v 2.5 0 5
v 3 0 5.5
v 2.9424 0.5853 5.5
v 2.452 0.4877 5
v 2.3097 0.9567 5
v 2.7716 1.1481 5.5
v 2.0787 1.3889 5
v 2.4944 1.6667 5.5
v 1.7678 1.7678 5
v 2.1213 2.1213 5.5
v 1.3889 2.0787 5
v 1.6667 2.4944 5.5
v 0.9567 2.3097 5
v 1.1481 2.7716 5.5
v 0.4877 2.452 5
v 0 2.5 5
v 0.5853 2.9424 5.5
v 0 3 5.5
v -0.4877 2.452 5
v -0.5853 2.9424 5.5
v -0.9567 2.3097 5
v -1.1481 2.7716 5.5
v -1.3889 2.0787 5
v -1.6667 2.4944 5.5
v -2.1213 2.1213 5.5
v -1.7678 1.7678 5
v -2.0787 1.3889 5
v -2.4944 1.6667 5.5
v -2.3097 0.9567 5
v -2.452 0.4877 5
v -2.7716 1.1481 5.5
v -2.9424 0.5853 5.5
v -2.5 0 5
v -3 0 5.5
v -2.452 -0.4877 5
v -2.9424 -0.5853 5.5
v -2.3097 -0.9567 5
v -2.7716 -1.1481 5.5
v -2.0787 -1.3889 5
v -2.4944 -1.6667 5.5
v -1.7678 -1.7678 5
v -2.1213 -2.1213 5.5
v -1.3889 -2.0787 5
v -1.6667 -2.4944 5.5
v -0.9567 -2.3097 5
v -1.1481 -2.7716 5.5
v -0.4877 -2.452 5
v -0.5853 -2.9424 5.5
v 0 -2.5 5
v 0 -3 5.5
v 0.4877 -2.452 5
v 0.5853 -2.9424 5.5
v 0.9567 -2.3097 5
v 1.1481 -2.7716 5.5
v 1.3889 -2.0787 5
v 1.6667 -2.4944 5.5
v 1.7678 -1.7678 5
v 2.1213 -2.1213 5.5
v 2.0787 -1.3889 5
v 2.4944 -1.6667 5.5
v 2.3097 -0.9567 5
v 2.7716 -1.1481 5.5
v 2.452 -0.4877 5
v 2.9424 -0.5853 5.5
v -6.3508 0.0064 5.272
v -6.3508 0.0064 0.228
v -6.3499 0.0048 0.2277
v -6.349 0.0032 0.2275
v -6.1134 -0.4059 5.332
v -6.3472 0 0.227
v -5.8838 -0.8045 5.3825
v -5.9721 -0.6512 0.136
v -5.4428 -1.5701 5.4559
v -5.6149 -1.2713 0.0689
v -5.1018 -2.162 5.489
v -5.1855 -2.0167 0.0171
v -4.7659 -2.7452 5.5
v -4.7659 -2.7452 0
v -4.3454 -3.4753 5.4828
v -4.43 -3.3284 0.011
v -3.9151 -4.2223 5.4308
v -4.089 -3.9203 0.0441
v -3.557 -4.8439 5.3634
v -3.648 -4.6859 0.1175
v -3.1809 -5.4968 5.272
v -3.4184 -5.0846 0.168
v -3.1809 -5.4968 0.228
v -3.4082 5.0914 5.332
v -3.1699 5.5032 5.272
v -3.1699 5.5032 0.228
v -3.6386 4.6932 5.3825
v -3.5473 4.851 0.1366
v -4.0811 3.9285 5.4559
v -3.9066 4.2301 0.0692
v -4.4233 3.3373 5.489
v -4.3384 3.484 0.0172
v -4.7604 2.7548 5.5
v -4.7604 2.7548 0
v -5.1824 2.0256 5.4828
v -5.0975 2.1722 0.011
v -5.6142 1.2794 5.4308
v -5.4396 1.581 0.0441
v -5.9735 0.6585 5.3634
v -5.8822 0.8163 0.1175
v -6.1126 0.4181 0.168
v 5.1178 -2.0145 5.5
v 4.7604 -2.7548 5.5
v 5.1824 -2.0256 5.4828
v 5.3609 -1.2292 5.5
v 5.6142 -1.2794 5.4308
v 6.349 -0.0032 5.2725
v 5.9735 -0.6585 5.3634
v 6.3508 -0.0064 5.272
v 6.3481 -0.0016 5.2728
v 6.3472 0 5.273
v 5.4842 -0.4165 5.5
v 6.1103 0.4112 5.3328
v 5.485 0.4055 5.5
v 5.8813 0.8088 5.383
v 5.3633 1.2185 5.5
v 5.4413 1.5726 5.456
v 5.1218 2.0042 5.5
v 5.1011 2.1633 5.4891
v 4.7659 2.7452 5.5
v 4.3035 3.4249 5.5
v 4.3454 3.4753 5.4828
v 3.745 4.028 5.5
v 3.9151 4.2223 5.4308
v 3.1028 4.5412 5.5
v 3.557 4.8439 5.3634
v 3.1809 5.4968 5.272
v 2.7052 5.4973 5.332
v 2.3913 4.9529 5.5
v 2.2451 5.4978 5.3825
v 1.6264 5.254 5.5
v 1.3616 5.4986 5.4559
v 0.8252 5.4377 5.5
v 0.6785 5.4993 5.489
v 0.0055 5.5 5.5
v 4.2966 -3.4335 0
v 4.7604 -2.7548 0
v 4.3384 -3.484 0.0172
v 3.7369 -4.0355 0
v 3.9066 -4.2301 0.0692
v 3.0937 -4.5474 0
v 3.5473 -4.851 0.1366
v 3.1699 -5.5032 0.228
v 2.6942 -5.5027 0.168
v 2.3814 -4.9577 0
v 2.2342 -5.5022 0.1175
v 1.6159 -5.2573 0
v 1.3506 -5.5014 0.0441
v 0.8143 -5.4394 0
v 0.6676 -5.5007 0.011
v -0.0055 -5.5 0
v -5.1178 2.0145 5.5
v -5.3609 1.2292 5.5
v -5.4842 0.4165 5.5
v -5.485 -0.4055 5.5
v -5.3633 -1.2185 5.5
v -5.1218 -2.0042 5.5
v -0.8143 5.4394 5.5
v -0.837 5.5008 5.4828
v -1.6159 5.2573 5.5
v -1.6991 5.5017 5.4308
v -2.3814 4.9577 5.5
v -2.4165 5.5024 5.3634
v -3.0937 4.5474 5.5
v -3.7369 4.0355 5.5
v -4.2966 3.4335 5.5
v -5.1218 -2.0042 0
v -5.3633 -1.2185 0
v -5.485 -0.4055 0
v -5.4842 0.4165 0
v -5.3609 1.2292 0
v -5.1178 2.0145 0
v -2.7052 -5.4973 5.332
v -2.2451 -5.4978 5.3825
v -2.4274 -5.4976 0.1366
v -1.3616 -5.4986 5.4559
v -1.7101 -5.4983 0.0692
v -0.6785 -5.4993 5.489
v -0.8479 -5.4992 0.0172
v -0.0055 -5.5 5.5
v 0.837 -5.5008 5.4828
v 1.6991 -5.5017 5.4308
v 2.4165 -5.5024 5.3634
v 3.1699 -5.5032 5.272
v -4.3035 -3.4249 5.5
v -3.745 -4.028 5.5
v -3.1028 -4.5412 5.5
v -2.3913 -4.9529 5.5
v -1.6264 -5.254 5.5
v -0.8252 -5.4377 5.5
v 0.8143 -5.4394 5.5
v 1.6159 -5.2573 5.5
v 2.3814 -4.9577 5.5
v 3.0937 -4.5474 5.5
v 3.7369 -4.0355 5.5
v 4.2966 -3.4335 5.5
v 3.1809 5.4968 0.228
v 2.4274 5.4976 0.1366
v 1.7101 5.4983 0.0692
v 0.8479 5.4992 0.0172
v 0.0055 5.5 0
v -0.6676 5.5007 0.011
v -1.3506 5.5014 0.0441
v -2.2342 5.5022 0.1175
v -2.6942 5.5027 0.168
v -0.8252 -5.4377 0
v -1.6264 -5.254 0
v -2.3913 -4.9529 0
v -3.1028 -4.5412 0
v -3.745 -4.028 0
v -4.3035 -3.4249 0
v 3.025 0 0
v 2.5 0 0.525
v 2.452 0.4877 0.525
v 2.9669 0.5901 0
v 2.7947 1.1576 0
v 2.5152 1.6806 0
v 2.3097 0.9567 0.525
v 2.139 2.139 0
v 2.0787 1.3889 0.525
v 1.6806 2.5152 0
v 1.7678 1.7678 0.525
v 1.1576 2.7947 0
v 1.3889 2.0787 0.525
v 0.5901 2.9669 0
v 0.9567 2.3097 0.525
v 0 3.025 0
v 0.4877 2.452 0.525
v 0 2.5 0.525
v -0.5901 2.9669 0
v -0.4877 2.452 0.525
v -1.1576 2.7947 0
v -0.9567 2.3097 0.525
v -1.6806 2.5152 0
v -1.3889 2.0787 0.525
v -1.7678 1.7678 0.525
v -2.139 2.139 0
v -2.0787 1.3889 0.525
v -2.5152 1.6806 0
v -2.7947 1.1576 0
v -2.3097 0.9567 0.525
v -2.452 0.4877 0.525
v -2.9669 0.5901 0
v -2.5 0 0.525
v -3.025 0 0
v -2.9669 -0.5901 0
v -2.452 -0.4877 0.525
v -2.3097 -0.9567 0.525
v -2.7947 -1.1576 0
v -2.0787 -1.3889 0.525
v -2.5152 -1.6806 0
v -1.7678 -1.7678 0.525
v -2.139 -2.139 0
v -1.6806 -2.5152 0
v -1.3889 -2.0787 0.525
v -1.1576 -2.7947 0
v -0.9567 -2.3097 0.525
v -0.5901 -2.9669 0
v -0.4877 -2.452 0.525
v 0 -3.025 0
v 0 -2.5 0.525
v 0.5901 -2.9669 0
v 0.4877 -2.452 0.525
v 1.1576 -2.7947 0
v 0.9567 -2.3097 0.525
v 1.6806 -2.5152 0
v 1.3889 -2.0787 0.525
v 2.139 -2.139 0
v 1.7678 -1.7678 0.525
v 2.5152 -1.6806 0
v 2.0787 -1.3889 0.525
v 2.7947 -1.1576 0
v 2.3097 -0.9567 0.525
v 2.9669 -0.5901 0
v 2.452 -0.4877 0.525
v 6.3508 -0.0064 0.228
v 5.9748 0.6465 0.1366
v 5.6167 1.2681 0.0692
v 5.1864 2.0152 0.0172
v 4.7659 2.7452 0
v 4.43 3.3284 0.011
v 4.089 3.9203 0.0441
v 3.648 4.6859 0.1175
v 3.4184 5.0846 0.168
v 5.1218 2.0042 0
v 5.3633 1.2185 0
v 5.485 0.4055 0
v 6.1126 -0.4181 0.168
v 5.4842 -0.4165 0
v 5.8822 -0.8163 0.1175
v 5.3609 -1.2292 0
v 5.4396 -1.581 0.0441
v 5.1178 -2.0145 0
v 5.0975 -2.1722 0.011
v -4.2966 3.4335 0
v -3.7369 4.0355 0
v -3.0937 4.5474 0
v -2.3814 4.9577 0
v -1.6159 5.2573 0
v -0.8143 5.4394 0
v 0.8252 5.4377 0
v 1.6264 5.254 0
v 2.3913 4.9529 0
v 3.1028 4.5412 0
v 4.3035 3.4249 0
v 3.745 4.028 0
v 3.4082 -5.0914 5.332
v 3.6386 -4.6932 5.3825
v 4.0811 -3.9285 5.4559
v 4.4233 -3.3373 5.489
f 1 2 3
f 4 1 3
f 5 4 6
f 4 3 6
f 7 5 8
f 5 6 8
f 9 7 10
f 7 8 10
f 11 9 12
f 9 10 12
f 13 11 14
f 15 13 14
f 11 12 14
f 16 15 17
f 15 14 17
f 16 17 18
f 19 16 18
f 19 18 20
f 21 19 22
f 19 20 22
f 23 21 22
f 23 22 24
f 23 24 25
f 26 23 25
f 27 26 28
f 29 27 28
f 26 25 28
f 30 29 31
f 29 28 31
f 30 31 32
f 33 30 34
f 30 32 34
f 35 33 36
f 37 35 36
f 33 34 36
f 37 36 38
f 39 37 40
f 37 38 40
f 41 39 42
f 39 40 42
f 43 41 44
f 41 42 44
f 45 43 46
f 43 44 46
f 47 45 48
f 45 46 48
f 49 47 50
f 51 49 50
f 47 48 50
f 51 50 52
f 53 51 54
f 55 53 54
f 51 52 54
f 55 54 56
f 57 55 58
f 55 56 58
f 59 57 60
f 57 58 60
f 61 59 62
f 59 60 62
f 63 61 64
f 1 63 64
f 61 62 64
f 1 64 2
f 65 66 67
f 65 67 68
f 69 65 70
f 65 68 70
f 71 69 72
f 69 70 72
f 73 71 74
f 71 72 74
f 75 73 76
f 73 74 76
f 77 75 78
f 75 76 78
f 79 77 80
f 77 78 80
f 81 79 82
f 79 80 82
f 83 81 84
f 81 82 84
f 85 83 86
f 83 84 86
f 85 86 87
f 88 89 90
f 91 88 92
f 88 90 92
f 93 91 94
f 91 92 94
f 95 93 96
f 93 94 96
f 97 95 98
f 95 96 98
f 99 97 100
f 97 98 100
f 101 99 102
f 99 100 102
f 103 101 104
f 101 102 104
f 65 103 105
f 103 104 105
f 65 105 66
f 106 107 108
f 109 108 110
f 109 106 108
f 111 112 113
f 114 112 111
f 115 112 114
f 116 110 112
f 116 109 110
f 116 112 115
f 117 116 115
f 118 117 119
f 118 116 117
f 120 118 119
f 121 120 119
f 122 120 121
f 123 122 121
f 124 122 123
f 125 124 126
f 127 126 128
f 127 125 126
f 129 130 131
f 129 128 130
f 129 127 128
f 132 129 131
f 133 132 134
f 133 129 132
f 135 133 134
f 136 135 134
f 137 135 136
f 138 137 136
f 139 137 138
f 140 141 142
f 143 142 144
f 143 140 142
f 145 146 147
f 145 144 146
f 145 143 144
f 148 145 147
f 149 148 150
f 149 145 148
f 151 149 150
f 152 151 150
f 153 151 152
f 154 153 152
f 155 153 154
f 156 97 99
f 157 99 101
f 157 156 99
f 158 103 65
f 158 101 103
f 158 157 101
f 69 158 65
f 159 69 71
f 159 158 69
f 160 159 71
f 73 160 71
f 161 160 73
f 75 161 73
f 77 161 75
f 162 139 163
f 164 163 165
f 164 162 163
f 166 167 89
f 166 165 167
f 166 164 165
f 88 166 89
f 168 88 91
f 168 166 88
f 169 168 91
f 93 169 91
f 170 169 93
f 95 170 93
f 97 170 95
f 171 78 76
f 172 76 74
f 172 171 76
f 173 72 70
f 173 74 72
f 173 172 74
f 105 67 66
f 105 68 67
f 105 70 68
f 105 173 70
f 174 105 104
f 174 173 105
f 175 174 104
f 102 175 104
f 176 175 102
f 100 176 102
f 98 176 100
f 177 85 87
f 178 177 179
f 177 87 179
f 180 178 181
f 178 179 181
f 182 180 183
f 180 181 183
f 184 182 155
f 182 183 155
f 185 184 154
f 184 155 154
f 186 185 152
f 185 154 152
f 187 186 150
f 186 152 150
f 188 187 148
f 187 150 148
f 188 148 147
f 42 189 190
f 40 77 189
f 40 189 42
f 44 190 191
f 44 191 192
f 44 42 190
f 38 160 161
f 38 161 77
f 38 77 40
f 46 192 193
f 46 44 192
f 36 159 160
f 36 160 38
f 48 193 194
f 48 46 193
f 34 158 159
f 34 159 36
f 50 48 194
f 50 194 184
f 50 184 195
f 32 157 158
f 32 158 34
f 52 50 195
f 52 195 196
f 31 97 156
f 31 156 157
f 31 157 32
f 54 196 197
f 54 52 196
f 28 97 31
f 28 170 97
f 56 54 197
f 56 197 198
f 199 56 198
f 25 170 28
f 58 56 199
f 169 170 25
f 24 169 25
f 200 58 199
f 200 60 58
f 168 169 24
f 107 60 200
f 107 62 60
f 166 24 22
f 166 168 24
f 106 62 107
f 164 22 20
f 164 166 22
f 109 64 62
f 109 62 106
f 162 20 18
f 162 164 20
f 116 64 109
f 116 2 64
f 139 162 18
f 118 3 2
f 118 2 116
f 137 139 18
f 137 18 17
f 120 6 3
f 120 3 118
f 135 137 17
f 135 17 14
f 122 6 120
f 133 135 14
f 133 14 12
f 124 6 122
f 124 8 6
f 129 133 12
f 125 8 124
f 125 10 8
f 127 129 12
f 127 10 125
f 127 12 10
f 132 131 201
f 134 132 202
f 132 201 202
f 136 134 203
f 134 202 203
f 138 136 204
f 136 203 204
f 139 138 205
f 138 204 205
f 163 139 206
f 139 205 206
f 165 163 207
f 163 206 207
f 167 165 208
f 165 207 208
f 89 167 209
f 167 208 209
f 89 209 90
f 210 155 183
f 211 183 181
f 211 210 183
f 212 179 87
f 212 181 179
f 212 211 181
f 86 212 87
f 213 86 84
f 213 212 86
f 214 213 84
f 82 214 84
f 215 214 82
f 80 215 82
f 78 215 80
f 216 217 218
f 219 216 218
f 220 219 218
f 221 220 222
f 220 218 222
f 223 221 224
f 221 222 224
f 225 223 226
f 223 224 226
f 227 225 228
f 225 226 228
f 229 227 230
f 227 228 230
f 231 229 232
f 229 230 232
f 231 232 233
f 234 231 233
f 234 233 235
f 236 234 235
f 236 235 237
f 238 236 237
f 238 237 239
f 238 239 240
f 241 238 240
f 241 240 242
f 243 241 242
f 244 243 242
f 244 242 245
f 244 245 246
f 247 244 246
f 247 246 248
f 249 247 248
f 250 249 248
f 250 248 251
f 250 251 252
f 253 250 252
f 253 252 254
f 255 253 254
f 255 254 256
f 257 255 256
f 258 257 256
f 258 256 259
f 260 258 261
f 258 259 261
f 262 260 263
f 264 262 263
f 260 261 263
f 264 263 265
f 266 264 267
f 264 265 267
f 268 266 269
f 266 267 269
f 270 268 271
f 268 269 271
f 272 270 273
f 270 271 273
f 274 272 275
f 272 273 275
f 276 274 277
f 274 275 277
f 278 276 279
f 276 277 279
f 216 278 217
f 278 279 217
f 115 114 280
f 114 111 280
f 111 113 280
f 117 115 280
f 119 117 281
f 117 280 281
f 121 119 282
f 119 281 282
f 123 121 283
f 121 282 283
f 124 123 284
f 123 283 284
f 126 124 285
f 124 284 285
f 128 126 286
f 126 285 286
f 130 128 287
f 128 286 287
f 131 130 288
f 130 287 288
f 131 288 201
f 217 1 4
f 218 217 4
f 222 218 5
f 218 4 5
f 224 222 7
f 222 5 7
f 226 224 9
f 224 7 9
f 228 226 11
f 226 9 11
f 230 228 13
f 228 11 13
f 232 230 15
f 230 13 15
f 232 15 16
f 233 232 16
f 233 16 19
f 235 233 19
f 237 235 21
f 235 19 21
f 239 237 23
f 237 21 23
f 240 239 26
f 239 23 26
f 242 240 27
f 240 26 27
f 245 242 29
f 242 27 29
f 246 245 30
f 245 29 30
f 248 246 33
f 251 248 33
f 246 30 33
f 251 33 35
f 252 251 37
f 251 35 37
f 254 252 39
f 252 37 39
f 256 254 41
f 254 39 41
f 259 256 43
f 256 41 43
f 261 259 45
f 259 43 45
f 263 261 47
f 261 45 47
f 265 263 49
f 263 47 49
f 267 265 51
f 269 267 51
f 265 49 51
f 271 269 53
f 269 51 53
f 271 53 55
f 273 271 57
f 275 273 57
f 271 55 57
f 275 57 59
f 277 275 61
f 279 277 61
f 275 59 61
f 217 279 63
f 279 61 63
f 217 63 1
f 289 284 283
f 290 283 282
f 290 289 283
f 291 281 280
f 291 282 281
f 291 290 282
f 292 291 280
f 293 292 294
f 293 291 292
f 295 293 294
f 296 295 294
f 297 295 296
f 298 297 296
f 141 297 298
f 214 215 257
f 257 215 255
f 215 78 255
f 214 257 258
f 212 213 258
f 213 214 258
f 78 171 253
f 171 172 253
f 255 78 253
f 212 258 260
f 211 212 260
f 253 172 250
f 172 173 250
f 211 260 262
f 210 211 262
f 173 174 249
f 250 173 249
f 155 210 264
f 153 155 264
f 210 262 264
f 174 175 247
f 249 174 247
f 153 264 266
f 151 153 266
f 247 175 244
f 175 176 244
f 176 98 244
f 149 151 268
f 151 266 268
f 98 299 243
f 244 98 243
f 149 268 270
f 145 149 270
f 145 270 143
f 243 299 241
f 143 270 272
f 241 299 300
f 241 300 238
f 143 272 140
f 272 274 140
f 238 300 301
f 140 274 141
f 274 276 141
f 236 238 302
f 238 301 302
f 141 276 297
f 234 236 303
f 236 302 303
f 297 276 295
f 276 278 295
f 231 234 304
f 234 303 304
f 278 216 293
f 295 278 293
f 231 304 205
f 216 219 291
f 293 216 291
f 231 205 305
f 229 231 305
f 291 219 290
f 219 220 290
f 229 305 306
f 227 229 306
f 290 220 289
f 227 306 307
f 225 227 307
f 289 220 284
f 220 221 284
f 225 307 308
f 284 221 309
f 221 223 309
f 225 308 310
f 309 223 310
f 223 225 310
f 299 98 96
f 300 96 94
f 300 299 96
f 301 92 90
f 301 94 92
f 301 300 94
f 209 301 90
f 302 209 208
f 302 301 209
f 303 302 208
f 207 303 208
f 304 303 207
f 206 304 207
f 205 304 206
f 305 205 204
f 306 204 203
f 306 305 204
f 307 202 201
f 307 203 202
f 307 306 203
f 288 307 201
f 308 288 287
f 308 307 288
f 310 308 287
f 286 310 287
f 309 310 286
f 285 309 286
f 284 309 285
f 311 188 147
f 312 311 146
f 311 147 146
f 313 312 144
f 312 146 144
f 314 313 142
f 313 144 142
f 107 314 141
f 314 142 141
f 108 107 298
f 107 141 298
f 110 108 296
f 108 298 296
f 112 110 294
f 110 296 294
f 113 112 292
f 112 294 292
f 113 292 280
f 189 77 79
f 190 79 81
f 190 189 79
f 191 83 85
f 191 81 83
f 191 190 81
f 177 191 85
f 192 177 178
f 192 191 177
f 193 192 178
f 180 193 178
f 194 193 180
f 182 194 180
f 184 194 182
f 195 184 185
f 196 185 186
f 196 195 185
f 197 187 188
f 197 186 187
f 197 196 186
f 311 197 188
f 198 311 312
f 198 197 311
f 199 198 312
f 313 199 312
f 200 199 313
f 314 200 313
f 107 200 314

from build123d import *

# Parameters (mm, degrees)
RESSALTO_EXTRUS_O2_DEPTH        = 5.5
ESBO_O3_OUTSIDE_W               = 115.272
ESBO_O3_OUTSIDE_H               = 113.576
ESBO_O3_OUTSIDE_R               = 5.5
CORTE_EXTRUS_O1_DEPTH           = 13
CORTE_EXTRUS_O1_DRAFT           = -75
ESBO_O4_OUTSIDE_W               = 115.272
ESBO_O4_OUTSIDE_H               = 113.576
ESBO_O4_OUTSIDE_R               = 5.5
CORTE_EXTRUS_O2_DEPTH           = 13
CORTE_EXTRUS_O2_DRAFT           = -75
FURO_ROSCADO_DE_M61_D           = 5
FURO_ROSCADO_DE_M61_CSINK_D     = 6.05
FURO_ROSCADO_DE_M61_CSINK_ANGLE = 90
CHANFRO1_SIZE                   = 0.5


with BuildPart() as part:
    # Esboço2 → Ressalto-extrusão2 (new body)
    with BuildSketch(Plane.XY):
        Polygon((3.180933655, 5.496816753), (-3.169916121, 5.503177729), (-6.350849776, 0.006360976), (-3.180933655, -5.496816753), (3.169916121, -5.503177729), (6.350849776, -0.006360976), align=None)
    extrude(amount=RESSALTO_EXTRUS_O2_DEPTH)


with BuildPart() as corte_extrus_o1_tool:
    # Esboço3 outside → Corte-extrusão1 (with draft: the straight prism first)
    with BuildSketch(Plane.XY.offset(5.5)):
        Rectangle(ESBO_O3_OUTSIDE_W, ESBO_O3_OUTSIDE_H)
        Circle(ESBO_O3_OUTSIDE_R, mode=Mode.SUBTRACT)
    extrude(amount=-CORTE_EXTRUS_O1_DEPTH)
    # Corte-extrusão1: the draft: its side faces are tilted about the plane it starts from
    corte_extrus_o1_sides = [corte_extrus_o1_tool.faces().sort_by_distance(p)[0] for p in [
        (0, -56.788, -1),
        (57.636, 0, -1),
        (0, 56.788, -1),
        (-57.636, 0, -1),
        (-5.5, 0, -1),
    ]]
    draft(corte_extrus_o1_sides, Plane.XY.offset(5.5), CORTE_EXTRUS_O1_DRAFT)


with BuildPart() as part_1:
    add(part.part)

    # Corte-extrusão1: cut by corte_extrus_o1_tool
    add(corte_extrus_o1_tool.part, mode=Mode.SUBTRACT)


with BuildPart() as corte_extrus_o2_tool:
    # Esboço4 outside → Corte-extrusão2 (with draft: the straight prism first)
    with BuildSketch(Plane(origin=(0, 0, 0), x_dir=(-1, 0, 0), z_dir=(0, 0, -1))):
        Rectangle(ESBO_O4_OUTSIDE_W, ESBO_O4_OUTSIDE_H)
        Circle(ESBO_O4_OUTSIDE_R, mode=Mode.SUBTRACT)
    extrude(amount=-CORTE_EXTRUS_O2_DEPTH)
    # Corte-extrusão2: the draft: its side faces are tilted about the plane it starts from
    corte_extrus_o2_sides = [corte_extrus_o2_tool.faces().sort_by_distance(p)[0] for p in [
        (0, -56.788, 6.5),
        (-57.636, 0, 6.5),
        (0, 56.788, 6.5),
        (57.636, 0, 6.5),
        (5.5, 0, 6.5),
    ]]
    draft(corte_extrus_o2_sides, Plane(origin=(0, 0, 0), x_dir=(-1, 0, 0), z_dir=(0, 0, -1)), CORTE_EXTRUS_O2_DRAFT)


with BuildPart() as part_2:
    add(part_1.part)

    # Corte-extrusão2: cut by corte_extrus_o2_tool
    add(corte_extrus_o2_tool.part, mode=Mode.SUBTRACT)

    # Furo roscado de M61 (through all)
    with Locations(Plane(origin=(0, 0, 0), x_dir=(-1, 0, 0), z_dir=(0, 0, -1))):
        with Locations((0, 0)):
            CounterSinkHole(FURO_ROSCADO_DE_M61_D / 2, FURO_ROSCADO_DE_M61_CSINK_D / 2, counter_sink_angle=FURO_ROSCADO_DE_M61_CSINK_ANGLE)

    # Chanfro1
    chanfro1_edges = [part_2.edges().sort_by_distance(p)[0] for p in [
        (-2.5, 0, 5.5),
    ]]
    chamfer(chanfro1_edges, length=CHANFRO1_SIZE)


solid = part_2.part
